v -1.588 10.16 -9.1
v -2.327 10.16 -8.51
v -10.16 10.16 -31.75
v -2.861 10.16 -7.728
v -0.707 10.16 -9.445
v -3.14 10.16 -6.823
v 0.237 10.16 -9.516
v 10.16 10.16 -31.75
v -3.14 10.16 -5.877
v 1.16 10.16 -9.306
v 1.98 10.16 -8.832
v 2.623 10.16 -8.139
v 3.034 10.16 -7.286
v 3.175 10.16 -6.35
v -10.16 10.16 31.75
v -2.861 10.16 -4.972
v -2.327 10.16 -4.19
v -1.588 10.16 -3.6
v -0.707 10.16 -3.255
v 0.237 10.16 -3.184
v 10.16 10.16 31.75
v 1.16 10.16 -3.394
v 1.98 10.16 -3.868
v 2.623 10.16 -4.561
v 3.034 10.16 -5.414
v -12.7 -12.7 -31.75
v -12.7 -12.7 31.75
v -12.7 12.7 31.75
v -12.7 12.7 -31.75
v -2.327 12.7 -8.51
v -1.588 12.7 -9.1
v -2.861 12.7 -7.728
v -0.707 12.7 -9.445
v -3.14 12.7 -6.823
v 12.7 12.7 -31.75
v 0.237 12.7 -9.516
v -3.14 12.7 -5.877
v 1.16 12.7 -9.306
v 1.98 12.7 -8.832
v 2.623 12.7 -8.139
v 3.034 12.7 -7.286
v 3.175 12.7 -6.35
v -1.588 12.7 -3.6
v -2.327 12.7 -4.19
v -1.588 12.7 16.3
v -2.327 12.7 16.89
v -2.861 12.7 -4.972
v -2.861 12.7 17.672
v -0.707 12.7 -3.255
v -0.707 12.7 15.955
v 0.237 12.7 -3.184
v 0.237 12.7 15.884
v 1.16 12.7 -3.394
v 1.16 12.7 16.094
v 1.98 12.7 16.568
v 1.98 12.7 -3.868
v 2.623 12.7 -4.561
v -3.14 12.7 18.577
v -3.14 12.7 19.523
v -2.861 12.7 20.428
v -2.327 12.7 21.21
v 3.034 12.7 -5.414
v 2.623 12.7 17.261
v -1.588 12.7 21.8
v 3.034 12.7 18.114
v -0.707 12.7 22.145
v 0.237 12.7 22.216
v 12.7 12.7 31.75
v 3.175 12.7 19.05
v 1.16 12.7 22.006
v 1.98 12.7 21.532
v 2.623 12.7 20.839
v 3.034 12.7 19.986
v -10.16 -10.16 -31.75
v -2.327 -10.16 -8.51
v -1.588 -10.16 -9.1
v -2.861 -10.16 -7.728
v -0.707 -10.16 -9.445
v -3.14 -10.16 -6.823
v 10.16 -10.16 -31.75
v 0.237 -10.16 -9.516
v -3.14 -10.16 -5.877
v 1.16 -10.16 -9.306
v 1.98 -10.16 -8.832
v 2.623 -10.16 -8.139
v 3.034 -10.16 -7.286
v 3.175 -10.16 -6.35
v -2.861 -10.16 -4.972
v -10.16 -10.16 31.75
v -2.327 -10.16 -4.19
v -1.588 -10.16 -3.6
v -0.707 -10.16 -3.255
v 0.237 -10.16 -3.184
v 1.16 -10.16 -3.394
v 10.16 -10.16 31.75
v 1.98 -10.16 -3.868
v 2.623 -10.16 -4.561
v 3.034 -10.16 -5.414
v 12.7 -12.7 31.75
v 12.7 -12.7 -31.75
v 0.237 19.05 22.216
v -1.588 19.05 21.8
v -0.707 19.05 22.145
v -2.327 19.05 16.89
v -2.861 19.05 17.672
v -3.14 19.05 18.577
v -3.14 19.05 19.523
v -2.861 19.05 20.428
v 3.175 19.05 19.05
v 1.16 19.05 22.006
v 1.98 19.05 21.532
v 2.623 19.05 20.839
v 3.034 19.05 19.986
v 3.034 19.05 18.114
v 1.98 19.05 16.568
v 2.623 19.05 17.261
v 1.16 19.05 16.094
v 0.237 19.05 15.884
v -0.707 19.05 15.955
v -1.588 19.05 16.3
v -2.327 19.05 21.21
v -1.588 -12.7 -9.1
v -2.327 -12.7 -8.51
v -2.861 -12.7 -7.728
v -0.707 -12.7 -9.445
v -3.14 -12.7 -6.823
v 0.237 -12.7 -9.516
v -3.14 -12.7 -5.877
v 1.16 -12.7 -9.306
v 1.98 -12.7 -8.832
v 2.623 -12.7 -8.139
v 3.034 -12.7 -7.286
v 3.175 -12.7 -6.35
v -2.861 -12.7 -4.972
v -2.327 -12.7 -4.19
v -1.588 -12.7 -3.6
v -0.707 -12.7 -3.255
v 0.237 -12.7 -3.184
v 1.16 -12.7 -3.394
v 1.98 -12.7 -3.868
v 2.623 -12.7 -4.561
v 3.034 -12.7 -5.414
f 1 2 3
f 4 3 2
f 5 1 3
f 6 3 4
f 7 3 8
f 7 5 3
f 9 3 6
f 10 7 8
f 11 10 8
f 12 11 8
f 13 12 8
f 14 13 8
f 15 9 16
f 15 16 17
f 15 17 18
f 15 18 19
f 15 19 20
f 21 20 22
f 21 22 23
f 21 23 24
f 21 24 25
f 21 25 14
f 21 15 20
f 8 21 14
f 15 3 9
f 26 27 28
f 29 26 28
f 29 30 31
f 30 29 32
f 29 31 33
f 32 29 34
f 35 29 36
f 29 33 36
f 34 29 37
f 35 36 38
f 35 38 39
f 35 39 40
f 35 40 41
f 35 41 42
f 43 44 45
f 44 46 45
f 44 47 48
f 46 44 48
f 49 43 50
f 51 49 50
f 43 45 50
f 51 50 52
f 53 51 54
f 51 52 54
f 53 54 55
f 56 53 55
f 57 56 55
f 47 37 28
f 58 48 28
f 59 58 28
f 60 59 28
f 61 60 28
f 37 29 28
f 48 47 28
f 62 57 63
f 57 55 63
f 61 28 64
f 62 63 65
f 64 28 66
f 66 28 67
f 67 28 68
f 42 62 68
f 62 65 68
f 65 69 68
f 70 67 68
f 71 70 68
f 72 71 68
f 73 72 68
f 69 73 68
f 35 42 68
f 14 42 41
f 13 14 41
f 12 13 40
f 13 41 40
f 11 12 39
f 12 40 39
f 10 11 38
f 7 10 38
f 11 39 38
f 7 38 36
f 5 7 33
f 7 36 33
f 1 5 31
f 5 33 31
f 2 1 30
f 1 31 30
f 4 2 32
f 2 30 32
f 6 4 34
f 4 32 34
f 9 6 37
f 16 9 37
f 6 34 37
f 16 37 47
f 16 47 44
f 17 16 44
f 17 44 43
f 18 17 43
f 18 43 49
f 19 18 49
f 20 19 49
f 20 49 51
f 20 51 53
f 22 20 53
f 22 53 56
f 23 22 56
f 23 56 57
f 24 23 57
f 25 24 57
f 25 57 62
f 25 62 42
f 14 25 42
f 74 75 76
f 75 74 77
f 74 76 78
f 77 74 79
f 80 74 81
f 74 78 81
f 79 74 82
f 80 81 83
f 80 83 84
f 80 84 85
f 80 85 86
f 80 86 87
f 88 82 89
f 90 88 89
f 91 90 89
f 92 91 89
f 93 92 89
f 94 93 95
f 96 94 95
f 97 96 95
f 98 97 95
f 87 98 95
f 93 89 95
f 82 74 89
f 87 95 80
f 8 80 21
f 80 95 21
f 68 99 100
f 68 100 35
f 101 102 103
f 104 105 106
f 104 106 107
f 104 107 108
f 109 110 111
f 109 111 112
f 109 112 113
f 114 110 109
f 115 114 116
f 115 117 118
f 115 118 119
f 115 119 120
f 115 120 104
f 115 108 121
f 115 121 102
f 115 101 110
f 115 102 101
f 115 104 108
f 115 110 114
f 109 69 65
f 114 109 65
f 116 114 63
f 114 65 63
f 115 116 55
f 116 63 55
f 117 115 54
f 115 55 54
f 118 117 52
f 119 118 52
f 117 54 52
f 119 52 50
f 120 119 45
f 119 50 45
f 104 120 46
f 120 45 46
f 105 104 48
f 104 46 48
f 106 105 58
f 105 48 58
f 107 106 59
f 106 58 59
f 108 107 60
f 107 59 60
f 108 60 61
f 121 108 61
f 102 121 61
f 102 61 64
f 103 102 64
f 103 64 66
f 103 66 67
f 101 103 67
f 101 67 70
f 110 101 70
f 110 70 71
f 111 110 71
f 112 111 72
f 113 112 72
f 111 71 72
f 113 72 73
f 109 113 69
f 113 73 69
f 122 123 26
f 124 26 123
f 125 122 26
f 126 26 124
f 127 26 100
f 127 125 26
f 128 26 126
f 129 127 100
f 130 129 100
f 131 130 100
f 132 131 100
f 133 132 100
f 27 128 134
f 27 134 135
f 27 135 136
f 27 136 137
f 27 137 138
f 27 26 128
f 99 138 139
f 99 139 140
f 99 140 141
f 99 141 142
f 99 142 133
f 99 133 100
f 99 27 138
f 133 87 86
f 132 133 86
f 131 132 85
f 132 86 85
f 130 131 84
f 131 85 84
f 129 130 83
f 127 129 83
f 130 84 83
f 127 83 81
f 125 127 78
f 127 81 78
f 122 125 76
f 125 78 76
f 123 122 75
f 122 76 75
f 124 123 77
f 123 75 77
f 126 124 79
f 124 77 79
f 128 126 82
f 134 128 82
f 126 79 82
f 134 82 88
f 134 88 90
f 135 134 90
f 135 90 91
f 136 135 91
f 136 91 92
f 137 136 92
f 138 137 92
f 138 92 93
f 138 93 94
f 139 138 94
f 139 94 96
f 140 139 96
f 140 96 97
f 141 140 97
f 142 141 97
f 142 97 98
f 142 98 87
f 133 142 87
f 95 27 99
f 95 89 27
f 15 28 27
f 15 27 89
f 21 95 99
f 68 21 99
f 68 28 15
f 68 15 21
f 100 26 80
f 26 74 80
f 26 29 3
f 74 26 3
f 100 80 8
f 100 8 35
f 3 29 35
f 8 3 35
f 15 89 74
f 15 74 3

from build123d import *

# Parameters (mm, degrees)
SKETCH1_W           = 25.4
SKETCH1_H           = 25.4
SKETCH1_W_2         = 20.32
SKETCH1_H_2         = 20.32
EXTRUDE_THIN1_DEPTH = 31.75
SKETCH2_R           = 3.175
BOSS_EXTRUDE1_DEPTH = 6.35
SKETCH4_R           = 3.175
CUT_EXTRUDE1_DEPTH  = 26.4


with BuildPart() as part:
    # Sketch1 → Extrude-Thin1 (new body, symmetric)
    with BuildSketch(Plane.XY):
        Rectangle(SKETCH1_W, SKETCH1_H)
        Rectangle(SKETCH1_W_2, SKETCH1_H_2, mode=Mode.SUBTRACT)
    extrude(amount=EXTRUDE_THIN1_DEPTH, both=True)

    # Sketch2 → Boss-Extrude1 (add)
    with BuildSketch(Plane(origin=(0, 12.7, 0), x_dir=(1, 0, 0), z_dir=(0, 1, 0))):
        with Locations((0, -19.05)):
            Circle(SKETCH2_R)
    extrude(amount=BOSS_EXTRUDE1_DEPTH)

    # Sketch4 → Cut-Extrude1 (cut, through all)
    with BuildSketch(Plane(origin=(0, 12.7, 0), x_dir=(1, 0, 0), z_dir=(0, 1, 0))):
        with Locations((0, 6.35)):
            Circle(SKETCH4_R)
    extrude(amount=-CUT_EXTRUDE1_DEPTH, mode=Mode.SUBTRACT)


solid = part.part
